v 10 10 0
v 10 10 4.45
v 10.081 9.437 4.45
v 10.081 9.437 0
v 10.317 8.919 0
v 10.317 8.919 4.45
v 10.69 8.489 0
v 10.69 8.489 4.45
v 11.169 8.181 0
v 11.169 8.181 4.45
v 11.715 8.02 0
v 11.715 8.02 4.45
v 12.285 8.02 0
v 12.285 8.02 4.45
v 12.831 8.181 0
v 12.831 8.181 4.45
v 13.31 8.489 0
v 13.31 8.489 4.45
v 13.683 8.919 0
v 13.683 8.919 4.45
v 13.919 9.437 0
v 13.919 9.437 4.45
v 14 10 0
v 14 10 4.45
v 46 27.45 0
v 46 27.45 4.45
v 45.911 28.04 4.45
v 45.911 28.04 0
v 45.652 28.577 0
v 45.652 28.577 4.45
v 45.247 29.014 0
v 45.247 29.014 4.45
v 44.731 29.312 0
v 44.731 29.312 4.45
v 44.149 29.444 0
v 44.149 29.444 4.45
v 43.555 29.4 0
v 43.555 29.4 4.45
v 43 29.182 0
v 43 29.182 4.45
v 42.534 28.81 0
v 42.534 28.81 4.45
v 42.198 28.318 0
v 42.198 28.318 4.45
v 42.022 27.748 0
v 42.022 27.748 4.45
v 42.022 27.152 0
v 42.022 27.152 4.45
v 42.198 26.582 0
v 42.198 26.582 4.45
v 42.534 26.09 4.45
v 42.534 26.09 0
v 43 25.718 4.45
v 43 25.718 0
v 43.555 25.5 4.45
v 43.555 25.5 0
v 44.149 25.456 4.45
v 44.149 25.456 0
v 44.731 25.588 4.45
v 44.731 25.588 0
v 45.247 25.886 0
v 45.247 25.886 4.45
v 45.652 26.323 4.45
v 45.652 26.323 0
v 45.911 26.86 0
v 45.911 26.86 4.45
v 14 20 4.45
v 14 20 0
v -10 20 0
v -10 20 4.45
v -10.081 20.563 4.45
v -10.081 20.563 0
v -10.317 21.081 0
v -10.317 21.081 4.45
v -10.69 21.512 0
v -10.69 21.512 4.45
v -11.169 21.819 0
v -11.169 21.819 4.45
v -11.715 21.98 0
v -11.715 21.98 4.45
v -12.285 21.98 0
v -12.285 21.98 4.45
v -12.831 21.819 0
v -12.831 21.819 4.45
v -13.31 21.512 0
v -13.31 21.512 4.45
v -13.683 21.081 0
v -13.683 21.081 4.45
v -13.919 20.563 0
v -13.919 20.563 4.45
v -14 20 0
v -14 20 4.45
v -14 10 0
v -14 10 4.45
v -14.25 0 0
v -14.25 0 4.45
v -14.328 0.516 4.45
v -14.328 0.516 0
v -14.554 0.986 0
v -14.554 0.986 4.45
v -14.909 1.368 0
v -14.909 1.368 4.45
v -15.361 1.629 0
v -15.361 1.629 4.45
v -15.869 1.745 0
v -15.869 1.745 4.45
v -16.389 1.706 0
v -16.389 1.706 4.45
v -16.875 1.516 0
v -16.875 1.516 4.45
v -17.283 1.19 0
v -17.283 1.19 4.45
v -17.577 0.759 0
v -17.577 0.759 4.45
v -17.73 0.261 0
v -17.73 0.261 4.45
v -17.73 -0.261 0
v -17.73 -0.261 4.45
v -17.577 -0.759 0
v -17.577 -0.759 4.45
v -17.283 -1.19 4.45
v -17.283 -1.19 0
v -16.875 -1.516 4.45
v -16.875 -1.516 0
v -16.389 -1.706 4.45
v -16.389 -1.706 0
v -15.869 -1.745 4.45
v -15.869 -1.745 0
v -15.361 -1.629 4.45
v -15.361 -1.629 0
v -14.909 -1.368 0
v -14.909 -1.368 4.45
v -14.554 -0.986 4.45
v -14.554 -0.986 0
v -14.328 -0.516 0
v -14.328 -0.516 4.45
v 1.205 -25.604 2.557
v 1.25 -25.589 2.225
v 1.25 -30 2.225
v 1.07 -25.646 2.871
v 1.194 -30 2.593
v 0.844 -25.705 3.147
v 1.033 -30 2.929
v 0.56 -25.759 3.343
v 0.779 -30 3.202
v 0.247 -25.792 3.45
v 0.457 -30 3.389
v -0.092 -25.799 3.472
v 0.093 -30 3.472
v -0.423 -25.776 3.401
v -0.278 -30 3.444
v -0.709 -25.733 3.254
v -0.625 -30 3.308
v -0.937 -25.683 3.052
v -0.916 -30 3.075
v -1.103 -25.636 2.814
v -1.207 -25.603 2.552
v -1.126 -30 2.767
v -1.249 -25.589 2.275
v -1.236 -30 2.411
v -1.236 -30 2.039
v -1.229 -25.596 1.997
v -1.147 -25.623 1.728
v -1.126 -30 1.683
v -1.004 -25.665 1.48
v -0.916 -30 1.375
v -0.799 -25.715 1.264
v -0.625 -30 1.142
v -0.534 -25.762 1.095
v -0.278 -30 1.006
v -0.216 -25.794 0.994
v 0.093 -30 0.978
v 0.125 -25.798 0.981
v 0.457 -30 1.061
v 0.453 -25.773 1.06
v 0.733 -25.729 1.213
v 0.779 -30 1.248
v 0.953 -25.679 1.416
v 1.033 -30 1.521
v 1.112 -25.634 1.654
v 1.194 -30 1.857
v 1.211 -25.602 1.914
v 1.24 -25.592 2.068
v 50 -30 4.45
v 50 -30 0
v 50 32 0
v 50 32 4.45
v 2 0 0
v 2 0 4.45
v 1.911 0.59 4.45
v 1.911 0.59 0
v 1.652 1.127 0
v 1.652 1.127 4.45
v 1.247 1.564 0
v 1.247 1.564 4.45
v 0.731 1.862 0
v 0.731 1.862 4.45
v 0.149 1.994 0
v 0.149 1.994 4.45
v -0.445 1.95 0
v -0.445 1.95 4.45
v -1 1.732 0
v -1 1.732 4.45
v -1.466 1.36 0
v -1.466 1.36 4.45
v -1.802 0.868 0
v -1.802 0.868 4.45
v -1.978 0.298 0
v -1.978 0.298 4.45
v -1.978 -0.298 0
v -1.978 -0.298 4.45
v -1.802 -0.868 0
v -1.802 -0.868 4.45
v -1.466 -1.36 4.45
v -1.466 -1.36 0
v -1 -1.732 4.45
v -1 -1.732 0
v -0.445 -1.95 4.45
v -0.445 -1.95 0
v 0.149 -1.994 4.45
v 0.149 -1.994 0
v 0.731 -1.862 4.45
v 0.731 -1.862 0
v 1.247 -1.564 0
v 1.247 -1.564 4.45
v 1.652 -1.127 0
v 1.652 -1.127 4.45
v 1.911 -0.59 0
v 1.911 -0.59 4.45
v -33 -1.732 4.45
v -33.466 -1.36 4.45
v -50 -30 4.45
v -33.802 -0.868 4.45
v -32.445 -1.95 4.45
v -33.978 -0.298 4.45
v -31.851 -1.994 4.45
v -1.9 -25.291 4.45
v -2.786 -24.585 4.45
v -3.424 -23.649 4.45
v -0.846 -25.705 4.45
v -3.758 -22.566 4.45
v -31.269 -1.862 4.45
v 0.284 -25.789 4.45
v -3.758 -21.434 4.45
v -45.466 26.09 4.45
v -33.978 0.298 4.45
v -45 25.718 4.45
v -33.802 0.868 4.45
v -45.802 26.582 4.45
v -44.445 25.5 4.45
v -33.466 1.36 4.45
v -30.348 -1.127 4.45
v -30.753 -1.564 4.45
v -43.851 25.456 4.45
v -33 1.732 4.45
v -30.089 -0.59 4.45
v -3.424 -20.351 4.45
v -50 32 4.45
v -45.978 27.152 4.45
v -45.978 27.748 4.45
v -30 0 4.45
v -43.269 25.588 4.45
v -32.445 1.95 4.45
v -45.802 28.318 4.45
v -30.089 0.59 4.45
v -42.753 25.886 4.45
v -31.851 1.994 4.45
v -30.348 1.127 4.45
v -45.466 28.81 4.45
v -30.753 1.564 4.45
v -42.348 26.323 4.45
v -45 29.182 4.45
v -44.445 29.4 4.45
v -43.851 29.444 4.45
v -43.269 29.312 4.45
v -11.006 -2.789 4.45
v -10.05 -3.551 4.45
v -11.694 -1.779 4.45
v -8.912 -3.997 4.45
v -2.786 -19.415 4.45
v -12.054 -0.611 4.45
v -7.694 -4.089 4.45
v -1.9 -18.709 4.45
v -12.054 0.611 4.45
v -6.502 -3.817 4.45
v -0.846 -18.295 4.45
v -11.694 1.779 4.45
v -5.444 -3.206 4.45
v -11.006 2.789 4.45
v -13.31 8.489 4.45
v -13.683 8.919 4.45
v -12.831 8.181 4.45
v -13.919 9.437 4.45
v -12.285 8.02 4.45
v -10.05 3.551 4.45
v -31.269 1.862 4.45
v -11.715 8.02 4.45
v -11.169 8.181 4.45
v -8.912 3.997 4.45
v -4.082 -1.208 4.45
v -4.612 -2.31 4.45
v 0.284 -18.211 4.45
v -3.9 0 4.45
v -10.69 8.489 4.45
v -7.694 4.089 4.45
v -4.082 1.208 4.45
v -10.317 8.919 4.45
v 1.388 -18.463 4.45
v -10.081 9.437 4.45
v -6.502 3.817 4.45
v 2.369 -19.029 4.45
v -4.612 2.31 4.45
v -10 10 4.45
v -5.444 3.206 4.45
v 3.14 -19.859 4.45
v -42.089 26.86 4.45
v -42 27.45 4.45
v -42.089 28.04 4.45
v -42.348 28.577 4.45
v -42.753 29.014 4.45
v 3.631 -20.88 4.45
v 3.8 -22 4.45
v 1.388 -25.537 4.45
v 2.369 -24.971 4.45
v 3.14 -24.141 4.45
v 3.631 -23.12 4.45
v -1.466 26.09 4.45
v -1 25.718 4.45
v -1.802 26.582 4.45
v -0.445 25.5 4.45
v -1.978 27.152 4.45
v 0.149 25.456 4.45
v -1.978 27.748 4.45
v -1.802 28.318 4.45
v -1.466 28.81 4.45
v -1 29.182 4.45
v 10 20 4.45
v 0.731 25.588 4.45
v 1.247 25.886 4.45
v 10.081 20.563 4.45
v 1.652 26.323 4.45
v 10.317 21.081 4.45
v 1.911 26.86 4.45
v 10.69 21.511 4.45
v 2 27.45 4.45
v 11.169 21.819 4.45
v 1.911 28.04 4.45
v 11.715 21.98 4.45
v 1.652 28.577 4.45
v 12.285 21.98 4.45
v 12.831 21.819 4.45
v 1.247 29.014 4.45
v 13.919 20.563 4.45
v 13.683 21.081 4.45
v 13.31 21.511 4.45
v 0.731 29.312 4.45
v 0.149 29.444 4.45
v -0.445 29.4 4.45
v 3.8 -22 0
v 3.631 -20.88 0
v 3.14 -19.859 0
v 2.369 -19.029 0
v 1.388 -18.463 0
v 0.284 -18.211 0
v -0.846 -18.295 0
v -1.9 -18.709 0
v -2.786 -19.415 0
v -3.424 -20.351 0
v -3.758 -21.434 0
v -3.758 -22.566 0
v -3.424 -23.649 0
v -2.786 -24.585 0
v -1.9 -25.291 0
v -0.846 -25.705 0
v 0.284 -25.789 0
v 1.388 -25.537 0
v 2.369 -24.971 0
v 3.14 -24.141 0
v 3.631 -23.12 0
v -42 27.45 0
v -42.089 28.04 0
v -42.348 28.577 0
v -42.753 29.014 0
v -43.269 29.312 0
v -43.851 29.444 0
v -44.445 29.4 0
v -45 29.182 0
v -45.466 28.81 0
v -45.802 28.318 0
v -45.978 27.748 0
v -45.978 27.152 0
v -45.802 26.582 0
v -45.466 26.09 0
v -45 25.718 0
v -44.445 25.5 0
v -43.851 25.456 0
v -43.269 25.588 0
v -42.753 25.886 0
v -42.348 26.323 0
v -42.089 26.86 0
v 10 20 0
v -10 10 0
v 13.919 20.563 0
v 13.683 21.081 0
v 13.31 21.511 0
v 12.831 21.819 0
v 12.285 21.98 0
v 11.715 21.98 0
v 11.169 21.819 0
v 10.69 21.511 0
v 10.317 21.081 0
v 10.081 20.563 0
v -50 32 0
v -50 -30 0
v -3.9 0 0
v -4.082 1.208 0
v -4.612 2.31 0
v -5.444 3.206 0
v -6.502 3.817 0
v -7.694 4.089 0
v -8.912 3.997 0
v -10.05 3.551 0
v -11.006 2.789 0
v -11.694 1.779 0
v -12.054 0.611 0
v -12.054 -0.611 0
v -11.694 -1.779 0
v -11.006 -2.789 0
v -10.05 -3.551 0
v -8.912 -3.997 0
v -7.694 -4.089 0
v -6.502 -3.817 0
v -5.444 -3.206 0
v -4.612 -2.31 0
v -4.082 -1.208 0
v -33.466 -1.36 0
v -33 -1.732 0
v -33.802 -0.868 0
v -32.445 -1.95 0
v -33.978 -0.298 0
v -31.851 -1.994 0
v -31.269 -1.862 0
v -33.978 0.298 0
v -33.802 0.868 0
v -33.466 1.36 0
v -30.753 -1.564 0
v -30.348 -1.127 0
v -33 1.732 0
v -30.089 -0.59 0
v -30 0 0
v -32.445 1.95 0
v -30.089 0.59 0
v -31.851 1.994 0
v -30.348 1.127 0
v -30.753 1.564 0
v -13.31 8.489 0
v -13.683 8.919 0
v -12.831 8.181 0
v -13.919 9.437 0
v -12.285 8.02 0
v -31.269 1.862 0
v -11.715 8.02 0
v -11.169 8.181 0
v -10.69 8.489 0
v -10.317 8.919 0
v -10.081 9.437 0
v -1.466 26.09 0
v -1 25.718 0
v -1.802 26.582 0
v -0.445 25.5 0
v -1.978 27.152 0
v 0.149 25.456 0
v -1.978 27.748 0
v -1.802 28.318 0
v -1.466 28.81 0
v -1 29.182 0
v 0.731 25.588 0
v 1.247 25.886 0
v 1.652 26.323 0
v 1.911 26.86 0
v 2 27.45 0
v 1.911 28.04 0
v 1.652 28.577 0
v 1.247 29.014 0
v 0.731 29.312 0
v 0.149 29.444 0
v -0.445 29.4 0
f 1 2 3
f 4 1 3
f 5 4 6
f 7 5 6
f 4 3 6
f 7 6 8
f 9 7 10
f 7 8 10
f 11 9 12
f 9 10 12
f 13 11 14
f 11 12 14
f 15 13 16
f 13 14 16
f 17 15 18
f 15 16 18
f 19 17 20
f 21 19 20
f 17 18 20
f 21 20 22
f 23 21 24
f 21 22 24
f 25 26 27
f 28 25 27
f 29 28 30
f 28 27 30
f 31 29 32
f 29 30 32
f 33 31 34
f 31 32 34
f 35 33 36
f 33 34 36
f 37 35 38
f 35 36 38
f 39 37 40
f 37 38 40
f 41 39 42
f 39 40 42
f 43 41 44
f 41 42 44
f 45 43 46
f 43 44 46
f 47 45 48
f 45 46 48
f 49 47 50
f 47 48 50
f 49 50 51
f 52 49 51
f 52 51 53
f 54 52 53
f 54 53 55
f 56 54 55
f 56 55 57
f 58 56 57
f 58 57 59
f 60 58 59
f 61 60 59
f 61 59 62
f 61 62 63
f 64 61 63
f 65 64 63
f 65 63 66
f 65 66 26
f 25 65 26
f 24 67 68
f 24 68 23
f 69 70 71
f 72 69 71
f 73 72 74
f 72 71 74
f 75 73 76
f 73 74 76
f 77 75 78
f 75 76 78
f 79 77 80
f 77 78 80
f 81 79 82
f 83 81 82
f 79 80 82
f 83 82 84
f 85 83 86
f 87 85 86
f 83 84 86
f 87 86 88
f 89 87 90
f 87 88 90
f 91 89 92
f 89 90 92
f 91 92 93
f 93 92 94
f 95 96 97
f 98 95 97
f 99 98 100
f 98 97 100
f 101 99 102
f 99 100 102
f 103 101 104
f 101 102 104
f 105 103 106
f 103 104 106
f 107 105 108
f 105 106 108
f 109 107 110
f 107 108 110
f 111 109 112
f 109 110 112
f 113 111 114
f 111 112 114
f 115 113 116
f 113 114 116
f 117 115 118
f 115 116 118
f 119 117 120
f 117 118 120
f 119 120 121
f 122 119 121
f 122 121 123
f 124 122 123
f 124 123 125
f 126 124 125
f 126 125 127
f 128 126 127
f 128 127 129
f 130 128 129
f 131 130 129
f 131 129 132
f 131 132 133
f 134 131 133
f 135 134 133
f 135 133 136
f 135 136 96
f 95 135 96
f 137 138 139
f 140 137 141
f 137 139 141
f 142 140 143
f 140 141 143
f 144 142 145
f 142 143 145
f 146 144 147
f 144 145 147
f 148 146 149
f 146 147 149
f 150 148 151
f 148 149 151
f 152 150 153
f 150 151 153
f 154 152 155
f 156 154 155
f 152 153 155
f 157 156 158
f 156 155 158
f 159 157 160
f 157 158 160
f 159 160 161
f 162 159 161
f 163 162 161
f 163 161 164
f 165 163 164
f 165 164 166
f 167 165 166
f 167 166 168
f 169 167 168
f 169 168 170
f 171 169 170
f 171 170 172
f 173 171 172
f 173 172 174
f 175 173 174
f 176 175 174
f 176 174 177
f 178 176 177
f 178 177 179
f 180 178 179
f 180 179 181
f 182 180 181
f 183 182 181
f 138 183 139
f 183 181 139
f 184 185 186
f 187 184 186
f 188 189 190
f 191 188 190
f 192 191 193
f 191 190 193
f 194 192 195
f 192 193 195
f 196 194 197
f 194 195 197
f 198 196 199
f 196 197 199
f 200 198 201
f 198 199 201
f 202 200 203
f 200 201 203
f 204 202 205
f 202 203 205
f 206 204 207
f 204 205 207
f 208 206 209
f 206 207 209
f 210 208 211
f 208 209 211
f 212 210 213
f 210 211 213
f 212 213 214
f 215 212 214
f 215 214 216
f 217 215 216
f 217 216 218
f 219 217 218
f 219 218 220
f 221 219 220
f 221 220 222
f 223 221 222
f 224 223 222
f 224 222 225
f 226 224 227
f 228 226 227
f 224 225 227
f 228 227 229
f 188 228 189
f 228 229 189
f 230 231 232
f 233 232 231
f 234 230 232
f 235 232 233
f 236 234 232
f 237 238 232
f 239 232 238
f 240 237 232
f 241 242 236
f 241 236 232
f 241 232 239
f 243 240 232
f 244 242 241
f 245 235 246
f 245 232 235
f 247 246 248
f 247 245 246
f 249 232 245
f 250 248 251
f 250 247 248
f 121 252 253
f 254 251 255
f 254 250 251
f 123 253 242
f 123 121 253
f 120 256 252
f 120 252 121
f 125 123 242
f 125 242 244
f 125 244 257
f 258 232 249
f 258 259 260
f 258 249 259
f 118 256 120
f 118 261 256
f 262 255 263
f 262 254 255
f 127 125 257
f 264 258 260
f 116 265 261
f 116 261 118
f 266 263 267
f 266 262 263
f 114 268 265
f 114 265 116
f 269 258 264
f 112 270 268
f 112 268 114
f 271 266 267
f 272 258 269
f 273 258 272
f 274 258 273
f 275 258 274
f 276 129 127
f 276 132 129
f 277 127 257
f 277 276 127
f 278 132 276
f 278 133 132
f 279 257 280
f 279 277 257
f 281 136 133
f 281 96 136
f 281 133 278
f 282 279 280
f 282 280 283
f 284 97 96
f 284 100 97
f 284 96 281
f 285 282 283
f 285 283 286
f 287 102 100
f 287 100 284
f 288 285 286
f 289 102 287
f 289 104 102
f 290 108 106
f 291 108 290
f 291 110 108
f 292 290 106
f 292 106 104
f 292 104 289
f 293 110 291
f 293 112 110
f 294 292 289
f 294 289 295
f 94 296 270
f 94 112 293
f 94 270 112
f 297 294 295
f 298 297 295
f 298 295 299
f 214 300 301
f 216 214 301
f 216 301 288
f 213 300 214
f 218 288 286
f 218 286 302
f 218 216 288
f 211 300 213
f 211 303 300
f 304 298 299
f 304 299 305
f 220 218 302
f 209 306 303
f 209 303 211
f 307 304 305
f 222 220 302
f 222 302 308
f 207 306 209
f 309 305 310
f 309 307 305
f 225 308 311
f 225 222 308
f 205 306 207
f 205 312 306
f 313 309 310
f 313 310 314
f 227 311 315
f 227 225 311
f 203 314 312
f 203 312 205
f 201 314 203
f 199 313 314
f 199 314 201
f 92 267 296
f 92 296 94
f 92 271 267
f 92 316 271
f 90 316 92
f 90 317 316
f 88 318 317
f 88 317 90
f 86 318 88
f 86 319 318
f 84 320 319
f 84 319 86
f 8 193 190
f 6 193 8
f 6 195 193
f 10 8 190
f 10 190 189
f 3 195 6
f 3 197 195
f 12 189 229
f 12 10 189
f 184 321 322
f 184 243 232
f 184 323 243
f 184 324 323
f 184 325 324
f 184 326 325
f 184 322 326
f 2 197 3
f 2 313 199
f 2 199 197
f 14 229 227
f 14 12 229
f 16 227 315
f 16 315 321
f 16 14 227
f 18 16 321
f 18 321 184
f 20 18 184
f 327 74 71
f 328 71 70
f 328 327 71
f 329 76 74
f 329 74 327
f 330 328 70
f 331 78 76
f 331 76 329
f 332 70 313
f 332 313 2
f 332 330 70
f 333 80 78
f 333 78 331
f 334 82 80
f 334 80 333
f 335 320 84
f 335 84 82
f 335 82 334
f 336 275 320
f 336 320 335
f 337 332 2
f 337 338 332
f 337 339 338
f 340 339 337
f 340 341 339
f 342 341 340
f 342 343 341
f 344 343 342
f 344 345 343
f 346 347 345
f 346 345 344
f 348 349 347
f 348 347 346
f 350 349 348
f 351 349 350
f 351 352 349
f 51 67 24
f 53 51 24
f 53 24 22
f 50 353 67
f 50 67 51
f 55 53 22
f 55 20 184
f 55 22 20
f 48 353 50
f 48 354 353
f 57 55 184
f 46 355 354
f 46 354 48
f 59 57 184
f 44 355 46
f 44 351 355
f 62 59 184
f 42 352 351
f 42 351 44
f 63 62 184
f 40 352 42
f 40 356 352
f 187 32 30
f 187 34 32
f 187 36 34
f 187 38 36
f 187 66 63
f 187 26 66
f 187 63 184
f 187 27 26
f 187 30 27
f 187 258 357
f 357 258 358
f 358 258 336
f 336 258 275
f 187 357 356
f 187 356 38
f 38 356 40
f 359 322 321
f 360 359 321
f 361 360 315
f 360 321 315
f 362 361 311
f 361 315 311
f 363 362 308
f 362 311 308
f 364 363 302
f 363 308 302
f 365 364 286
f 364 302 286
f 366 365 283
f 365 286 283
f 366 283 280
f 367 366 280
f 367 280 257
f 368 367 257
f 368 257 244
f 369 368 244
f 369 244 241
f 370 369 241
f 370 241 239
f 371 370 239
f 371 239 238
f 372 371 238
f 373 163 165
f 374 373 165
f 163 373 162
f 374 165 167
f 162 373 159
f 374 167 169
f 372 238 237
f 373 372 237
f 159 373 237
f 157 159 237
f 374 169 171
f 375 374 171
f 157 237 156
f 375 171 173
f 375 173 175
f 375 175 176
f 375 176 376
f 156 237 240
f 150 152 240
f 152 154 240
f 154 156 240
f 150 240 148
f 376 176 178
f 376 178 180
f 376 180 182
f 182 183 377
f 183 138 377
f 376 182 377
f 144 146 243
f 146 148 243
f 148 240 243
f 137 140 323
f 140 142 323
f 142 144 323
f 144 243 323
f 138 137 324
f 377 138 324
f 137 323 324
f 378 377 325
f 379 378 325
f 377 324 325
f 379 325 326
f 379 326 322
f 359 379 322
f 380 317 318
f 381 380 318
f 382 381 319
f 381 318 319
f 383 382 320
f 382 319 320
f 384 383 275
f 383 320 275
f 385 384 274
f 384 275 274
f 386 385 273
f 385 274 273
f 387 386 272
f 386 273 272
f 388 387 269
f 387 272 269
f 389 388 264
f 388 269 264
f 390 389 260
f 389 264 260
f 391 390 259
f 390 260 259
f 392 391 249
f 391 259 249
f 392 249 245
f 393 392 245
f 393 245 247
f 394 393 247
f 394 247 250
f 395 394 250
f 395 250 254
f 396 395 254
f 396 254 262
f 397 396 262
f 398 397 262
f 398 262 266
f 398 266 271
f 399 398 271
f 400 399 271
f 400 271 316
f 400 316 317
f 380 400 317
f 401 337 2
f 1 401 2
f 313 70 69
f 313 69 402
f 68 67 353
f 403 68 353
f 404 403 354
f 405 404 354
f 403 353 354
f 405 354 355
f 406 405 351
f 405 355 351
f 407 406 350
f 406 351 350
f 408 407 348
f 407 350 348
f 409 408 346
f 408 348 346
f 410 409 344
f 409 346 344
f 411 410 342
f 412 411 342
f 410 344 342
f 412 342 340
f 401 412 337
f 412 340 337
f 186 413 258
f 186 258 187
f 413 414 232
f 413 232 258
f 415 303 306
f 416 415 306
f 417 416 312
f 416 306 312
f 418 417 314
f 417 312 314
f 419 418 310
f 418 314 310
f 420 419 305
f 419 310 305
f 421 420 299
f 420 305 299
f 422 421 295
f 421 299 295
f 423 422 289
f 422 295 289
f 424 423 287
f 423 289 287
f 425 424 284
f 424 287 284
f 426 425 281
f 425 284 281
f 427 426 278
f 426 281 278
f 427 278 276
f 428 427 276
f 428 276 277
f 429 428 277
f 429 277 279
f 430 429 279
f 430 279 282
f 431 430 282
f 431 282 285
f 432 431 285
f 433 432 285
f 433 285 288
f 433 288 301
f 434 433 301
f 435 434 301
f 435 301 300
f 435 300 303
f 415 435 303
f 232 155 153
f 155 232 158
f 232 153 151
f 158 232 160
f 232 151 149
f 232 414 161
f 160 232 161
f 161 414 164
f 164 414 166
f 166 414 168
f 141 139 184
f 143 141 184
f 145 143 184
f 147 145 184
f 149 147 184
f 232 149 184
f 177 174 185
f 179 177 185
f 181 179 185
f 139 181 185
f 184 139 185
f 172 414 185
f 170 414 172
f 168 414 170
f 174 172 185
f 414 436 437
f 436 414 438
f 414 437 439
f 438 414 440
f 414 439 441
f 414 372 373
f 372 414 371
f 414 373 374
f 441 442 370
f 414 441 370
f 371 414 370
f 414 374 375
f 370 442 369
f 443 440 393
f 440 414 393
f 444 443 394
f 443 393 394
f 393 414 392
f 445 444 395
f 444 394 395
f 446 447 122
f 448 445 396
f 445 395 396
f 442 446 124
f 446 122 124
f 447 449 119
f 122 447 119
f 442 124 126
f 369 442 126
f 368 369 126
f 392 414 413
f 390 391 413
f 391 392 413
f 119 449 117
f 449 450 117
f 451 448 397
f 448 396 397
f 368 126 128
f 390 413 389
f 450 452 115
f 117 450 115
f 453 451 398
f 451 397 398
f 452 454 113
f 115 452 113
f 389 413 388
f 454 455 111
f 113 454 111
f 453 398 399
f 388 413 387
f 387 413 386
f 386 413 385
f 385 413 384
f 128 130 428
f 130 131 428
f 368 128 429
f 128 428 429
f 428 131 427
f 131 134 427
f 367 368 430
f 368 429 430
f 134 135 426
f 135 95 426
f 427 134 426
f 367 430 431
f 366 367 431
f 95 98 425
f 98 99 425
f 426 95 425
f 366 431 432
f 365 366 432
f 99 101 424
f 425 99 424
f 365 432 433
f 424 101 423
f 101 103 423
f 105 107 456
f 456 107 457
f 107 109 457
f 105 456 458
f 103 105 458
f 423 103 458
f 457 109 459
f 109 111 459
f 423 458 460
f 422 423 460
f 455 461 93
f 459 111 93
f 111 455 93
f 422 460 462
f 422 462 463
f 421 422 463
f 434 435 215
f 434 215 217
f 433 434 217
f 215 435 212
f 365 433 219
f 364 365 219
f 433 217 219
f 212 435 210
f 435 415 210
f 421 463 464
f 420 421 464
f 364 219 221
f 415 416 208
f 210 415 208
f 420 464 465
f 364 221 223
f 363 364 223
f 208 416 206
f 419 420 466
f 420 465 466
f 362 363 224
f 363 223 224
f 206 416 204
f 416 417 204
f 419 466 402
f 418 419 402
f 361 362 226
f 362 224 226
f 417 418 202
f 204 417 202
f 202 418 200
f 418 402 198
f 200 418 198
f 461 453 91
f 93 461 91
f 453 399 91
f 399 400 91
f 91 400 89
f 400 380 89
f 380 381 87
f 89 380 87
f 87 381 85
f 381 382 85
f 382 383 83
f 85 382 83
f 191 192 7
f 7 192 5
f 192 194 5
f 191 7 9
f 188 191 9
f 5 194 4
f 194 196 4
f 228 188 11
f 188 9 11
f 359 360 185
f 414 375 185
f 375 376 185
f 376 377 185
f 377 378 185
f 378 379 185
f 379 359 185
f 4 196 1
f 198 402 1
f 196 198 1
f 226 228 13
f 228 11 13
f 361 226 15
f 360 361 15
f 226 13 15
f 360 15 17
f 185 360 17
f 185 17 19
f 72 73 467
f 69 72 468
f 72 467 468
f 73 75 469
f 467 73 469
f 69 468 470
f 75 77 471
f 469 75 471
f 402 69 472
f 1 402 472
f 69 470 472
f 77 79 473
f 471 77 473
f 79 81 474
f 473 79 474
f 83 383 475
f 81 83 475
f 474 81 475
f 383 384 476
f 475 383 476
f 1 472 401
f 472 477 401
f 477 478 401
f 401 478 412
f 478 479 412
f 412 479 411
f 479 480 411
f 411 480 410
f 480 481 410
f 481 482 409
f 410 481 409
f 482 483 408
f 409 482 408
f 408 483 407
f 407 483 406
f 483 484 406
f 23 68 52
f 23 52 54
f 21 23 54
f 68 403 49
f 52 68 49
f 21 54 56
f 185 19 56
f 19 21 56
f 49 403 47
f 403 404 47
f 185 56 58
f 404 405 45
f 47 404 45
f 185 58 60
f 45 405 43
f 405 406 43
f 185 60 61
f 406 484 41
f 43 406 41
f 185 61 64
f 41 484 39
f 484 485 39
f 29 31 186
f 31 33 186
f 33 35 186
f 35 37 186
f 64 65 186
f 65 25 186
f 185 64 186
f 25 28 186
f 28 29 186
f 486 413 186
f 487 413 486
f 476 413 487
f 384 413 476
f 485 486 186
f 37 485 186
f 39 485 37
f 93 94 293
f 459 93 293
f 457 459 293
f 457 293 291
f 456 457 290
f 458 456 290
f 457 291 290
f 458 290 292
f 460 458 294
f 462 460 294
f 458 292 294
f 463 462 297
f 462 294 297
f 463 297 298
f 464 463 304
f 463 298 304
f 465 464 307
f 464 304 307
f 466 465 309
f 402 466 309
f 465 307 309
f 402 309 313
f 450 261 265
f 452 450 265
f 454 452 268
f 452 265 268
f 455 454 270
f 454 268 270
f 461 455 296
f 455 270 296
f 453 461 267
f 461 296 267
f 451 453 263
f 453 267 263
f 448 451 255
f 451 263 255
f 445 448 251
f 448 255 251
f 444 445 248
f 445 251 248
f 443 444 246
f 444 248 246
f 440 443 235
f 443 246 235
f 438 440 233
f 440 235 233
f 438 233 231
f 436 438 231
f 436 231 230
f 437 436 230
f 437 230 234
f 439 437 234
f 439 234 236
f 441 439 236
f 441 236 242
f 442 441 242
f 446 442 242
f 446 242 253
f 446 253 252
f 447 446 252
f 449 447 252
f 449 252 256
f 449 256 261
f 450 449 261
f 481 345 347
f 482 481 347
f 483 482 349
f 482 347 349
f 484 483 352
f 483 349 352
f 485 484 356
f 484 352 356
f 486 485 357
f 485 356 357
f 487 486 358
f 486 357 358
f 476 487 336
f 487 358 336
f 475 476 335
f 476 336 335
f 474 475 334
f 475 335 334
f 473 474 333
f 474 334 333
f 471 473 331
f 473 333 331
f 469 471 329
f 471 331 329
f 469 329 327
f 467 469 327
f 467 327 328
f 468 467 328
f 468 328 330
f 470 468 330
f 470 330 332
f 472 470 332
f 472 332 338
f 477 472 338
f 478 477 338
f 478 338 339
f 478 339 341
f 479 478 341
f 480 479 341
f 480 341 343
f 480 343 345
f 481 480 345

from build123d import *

# Parameters (mm, degrees)
SKETCH_W        = 100
SKETCH_H        = 62
PAD_DEPTH       = 4.45
SKETCH001_R     = 2
POCKET_DEPTH    = 4.45
SKETCH004_R     = 4.1
POCKET002_DEPTH = 5
SKETCH009_R     = 3.8
POCKET005_DEPTH = 5
SKETCH010_R     = 1.25
POCKET006_DEPTH = 5
SKETCH011_R     = 1.75
SKETCH011_R_2   = 2
POCKET007_DEPTH = 5
POCKET008_DEPTH = 5
SKETCH013_R     = 2
POCKET009_DEPTH = 5


with BuildPart() as part:
    # Sketch → Pad (new body)
    with BuildSketch(Plane.XY):
        with Locations((0, 1)):
            Rectangle(SKETCH_W, SKETCH_H)
    extrude(amount=PAD_DEPTH)

    # Sketch001 → Pocket (cut)
    with BuildSketch(Plane.XY.offset(4.45)):
        Circle(SKETCH001_R)
    extrude(amount=-POCKET_DEPTH, mode=Mode.SUBTRACT)

    # Sketch004 → Pocket002 (cut)
    with BuildSketch(Plane.XY.offset(4.45)):
        with Locations((-8, 0)):
            Circle(SKETCH004_R)
    extrude(amount=-POCKET002_DEPTH, mode=Mode.SUBTRACT)

    # Sketch009 → Pocket005 (cut)
    with BuildSketch(Plane.XY.offset(4.45)):
        with Locations((0, -22)):
            Circle(SKETCH009_R)
    extrude(amount=-POCKET005_DEPTH, mode=Mode.SUBTRACT)

    # Sketch010 → Pocket006 (cut)
    with BuildSketch(Plane.XZ.offset(30)):
        with Locations((0, 2.225)):
            Circle(SKETCH010_R)
    extrude(amount=-POCKET006_DEPTH, mode=Mode.SUBTRACT)

    # Sketch011 → Pocket007 (cut)
    with BuildSketch(Plane.XY.offset(4.45)):
        with Locations((-16, 0)):
            Circle(SKETCH011_R)
        with Locations((-32, 0)):
            Circle(SKETCH011_R_2)
    extrude(amount=-POCKET007_DEPTH, mode=Mode.SUBTRACT)

    # Sketch012 → Pocket008 (cut)
    with BuildSketch(Plane.XY.offset(4.45)):
        with BuildLine():
            ThreePointArc((14, 20), (12, 22), (10, 20))
            Line((10, 20), (10, 10))
            ThreePointArc((10, 10), (12, 8), (14, 10))
            Line((14, 20), (14, 10))
        make_face()
        with BuildLine():
            ThreePointArc((-10, 20), (-11.999997, 22.000006), (-14, 20.000006))
            Line((-14, 20.000006), (-14, 10.00001))
            ThreePointArc((-14, 10.00001), (-12.000005, 8.000011), (-10, 10))
            Line((-10, 20), (-10, 10))
        make_face()
    extrude(amount=-POCKET008_DEPTH, mode=Mode.SUBTRACT)

    # Sketch013 → Pocket009 (cut)
    with BuildSketch(Plane.XY.offset(4.45)):
        with Locations((44, 27.45)):
            Circle(SKETCH013_R)
        with Locations((-44, 27.45)):
            Circle(SKETCH013_R)
        with Locations((0, 27.45)):
            Circle(SKETCH013_R)
    extrude(amount=-POCKET009_DEPTH, mode=Mode.SUBTRACT)


solid = part.part
